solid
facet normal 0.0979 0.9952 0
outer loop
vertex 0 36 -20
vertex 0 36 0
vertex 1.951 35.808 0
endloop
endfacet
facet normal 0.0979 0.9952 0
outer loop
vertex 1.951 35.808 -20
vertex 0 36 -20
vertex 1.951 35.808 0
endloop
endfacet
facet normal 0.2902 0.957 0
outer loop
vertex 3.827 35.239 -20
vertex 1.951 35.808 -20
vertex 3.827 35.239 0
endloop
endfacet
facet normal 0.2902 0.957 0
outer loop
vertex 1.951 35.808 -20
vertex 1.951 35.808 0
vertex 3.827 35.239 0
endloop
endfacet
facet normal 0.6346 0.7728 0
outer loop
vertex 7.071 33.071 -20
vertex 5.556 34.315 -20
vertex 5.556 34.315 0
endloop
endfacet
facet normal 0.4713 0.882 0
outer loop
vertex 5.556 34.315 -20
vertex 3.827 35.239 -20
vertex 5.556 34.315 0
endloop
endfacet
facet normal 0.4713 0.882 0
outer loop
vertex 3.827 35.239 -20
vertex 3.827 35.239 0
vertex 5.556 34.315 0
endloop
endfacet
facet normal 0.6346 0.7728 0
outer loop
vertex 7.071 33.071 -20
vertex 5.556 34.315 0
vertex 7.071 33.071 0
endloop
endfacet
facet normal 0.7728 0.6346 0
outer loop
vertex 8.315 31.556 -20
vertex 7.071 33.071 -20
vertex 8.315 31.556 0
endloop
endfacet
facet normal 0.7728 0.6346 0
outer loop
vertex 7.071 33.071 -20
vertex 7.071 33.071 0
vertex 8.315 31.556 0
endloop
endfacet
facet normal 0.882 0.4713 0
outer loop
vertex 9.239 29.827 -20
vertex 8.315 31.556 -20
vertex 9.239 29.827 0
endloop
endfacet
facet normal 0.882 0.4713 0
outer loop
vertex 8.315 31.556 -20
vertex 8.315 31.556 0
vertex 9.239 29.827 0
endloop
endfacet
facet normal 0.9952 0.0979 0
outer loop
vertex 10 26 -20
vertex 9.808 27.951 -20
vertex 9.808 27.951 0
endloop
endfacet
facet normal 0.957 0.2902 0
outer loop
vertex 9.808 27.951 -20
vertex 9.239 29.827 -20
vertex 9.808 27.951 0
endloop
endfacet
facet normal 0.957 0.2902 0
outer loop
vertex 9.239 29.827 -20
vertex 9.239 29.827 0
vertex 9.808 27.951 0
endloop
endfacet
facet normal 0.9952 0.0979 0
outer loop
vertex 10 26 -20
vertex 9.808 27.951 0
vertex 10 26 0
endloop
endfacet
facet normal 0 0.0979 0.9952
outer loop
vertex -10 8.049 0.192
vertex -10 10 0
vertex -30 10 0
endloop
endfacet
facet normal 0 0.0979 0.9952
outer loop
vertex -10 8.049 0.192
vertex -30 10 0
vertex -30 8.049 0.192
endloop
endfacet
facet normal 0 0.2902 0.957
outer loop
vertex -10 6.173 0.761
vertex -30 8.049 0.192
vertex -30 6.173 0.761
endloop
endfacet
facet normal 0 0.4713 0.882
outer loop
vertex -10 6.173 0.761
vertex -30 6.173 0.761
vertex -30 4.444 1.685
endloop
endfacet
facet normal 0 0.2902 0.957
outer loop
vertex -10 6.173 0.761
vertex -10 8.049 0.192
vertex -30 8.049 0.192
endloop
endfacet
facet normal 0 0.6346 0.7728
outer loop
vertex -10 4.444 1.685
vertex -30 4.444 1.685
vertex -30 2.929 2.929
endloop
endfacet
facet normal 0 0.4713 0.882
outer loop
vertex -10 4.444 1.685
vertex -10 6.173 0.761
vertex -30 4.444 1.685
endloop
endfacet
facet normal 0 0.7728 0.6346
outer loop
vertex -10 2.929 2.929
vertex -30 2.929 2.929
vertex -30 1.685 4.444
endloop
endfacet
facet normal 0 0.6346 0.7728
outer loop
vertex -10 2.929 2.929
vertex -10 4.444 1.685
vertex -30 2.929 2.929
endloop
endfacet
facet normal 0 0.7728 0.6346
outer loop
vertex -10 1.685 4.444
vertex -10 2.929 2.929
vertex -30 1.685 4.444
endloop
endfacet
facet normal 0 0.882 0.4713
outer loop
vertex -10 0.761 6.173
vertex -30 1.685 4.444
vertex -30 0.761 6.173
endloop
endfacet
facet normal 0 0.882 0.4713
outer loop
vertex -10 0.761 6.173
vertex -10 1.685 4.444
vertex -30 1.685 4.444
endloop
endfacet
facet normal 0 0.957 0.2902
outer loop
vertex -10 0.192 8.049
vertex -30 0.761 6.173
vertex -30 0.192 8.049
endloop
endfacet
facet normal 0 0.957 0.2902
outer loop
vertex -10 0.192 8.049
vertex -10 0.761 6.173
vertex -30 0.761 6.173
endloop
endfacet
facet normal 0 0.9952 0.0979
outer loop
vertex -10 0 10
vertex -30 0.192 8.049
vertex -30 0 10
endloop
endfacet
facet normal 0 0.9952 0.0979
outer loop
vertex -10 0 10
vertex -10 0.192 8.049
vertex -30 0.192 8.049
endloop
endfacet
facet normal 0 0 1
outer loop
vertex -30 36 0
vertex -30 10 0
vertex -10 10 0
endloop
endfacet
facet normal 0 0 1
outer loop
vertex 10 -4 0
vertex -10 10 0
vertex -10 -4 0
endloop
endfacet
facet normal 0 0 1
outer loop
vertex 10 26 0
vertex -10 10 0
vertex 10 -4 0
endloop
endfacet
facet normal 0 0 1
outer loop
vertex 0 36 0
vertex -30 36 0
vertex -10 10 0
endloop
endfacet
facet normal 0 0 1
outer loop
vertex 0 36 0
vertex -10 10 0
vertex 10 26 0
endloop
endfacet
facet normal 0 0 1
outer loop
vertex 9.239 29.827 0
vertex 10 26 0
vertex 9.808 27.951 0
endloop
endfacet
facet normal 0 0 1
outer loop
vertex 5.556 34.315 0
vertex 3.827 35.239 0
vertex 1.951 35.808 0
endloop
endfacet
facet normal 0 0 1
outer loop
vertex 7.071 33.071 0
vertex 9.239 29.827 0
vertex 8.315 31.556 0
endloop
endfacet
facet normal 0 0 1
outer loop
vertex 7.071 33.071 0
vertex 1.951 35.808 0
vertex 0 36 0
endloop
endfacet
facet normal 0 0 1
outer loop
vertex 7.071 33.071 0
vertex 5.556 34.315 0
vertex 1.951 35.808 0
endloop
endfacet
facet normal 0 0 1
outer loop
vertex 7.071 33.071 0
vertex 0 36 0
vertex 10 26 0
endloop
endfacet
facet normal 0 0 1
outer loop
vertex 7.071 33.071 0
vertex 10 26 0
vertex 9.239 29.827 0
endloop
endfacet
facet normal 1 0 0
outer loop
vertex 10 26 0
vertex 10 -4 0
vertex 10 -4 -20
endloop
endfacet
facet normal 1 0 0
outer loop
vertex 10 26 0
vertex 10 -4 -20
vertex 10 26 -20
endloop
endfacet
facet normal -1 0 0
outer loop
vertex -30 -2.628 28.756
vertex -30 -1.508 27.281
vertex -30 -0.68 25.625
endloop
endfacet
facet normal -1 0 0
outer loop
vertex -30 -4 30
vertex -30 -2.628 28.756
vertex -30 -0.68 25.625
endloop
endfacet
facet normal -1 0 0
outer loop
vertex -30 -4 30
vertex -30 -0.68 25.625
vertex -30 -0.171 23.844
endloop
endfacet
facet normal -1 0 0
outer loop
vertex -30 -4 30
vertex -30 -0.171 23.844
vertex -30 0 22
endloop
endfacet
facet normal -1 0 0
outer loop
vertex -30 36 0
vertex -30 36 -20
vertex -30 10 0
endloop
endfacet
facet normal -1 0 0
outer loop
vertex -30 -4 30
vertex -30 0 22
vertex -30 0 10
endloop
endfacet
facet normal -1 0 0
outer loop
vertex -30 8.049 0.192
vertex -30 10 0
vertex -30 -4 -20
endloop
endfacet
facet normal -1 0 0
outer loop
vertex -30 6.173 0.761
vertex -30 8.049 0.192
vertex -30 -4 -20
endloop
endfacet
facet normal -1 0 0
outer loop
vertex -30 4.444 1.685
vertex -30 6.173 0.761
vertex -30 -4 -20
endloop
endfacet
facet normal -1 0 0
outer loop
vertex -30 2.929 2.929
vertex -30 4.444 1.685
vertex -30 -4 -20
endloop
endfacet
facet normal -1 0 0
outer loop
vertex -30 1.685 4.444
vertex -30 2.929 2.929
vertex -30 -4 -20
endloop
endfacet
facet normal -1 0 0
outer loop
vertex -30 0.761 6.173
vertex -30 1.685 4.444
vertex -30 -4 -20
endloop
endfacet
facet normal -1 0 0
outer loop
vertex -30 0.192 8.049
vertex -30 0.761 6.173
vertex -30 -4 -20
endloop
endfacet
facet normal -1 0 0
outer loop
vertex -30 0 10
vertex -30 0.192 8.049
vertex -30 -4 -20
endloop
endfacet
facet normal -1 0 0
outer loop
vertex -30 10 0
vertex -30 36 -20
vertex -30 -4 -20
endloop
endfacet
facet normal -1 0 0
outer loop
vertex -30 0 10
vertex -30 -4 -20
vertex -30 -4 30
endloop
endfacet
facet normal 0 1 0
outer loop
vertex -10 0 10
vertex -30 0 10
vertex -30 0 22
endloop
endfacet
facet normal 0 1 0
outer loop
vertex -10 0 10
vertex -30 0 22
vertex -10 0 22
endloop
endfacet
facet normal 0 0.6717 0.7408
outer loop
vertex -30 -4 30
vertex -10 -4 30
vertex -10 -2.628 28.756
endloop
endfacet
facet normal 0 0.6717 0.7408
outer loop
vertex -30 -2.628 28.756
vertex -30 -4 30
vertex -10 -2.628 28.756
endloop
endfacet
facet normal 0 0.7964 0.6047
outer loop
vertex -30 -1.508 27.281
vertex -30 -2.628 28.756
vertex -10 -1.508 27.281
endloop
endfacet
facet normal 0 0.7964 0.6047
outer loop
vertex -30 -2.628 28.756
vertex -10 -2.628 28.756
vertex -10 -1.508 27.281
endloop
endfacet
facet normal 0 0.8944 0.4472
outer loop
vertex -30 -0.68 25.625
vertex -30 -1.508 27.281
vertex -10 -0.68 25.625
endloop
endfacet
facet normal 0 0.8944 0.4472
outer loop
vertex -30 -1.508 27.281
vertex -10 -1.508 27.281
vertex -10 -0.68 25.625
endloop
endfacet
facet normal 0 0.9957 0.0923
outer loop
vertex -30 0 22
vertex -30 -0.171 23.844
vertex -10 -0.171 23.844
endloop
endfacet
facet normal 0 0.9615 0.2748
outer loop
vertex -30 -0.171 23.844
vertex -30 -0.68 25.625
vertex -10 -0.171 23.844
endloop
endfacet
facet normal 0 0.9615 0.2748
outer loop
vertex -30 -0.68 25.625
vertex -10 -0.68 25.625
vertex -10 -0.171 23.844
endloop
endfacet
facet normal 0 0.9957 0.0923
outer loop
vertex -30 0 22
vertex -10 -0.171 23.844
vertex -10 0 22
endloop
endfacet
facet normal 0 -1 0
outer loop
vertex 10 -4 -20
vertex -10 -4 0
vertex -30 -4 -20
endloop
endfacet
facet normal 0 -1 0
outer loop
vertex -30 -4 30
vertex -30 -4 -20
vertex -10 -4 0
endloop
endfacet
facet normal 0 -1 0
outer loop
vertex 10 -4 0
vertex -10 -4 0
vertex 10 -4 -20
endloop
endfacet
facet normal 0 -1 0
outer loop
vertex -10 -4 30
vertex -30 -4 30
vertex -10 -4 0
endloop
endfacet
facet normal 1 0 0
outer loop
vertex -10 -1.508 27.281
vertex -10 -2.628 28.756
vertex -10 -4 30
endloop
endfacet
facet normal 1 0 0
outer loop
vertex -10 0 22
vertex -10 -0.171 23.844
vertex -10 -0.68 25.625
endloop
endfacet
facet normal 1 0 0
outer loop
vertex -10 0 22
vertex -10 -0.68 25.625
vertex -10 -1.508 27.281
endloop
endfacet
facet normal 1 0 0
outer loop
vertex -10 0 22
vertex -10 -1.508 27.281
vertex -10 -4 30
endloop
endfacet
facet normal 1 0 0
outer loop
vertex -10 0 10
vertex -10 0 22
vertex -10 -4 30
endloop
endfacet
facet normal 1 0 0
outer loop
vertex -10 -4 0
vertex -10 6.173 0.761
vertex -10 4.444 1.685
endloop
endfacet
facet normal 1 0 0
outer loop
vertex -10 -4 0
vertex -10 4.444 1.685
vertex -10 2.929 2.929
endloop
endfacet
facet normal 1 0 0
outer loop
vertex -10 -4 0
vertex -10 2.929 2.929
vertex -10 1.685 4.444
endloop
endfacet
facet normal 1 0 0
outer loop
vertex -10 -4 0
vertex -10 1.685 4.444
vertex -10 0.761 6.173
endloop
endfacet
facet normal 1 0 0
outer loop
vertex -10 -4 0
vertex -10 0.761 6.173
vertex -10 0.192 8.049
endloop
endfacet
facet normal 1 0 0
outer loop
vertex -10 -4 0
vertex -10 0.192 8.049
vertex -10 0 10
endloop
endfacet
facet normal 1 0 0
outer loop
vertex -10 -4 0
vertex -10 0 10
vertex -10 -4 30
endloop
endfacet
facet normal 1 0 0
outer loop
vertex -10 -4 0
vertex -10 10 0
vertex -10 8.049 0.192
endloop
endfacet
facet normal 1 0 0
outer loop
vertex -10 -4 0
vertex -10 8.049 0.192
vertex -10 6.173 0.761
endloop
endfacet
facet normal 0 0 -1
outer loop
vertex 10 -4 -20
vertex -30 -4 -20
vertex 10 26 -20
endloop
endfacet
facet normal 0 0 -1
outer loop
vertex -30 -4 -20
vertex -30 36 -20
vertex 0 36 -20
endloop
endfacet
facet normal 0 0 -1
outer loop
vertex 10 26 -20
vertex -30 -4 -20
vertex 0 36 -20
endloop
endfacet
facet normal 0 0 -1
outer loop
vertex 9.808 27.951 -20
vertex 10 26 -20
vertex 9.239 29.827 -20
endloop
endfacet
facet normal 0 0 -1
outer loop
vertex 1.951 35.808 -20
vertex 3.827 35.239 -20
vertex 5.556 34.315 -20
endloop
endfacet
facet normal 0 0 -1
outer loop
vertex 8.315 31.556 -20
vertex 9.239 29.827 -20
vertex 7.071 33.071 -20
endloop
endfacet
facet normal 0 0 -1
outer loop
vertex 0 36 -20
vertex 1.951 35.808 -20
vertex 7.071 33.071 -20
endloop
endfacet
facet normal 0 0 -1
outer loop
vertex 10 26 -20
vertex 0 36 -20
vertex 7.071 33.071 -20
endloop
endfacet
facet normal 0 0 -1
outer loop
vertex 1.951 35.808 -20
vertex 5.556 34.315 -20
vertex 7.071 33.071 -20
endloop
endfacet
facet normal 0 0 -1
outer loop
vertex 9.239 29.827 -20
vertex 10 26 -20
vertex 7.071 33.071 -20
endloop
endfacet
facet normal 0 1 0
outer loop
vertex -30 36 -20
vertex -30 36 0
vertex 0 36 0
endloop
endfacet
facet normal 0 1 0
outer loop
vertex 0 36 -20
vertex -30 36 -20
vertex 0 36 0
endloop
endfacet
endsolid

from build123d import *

# Parameters (mm, degrees)
SKETCH1_W           = 20
SKETCH1_H           = 4
BOSS_EXTRUDE1_DEPTH = 30
SKETCH2_W           = 40
SKETCH2_H           = 40
BOSS_EXTRUDE2_DEPTH = 20
FILLET1_R           = 10


with BuildPart() as part:
    # Sketch1 → Boss-Extrude1 (new body)
    with BuildSketch(Plane.XY):
        with Locations((-20, -2)):
            Rectangle(SKETCH1_W, SKETCH1_H)
    extrude(amount=BOSS_EXTRUDE1_DEPTH)

    # Sketch2 → Boss-Extrude2 (add)
    with BuildSketch(Plane.XY):
        with Locations((-10, 16)):
            Rectangle(SKETCH2_W, SKETCH2_H)
    extrude(amount=-BOSS_EXTRUDE2_DEPTH)

    # Fillet1
    # the kernel refuses this fillet: 10 mm, written as the material it adds along each edge
    with BuildSketch(Plane(origin=(-10, 0, 0), x_dir=(0, 1, 0), z_dir=(-1, 0, 0))) as fillet1_piece_1:
        with BuildLine():
            CenterArc((FILLET1_R, -FILLET1_R), FILLET1_R, 90, 90)
            Line((0, -FILLET1_R), (0, 0))
            Line((0, 0), (FILLET1_R, 0))
        make_face()
    extrude(amount=20)
    # the kernel refuses this fillet: 10 mm, written as the material it takes off along each edge
    with BuildSketch(Plane(origin=(10, 36, 25), x_dir=(-1, 0, 0), z_dir=(0, 0, -1))) as fillet1_2_piece_1:
        with BuildLine():
            CenterArc((FILLET1_R, -FILLET1_R), FILLET1_R, 90, 90)
            Line((0, -FILLET1_R), (0, 0))
            Line((0, 0), (FILLET1_R, 0))
        make_face()
    extrude(amount=70, mode=Mode.SUBTRACT)
    with BuildSketch(Plane(origin=(10, 0, 30), x_dir=(0, 0, -1), z_dir=(-1, 0, 0))) as fillet1_2_piece_2:
        with BuildLine():
            CenterArc((8, 10), FILLET1_R, 216.869897646, 53.130102354)
            Line((0, 4), (0, 0))
            Line((0, 0), (8, 0))
        make_face()
    extrude(amount=60, mode=Mode.SUBTRACT)


solid = part.part
